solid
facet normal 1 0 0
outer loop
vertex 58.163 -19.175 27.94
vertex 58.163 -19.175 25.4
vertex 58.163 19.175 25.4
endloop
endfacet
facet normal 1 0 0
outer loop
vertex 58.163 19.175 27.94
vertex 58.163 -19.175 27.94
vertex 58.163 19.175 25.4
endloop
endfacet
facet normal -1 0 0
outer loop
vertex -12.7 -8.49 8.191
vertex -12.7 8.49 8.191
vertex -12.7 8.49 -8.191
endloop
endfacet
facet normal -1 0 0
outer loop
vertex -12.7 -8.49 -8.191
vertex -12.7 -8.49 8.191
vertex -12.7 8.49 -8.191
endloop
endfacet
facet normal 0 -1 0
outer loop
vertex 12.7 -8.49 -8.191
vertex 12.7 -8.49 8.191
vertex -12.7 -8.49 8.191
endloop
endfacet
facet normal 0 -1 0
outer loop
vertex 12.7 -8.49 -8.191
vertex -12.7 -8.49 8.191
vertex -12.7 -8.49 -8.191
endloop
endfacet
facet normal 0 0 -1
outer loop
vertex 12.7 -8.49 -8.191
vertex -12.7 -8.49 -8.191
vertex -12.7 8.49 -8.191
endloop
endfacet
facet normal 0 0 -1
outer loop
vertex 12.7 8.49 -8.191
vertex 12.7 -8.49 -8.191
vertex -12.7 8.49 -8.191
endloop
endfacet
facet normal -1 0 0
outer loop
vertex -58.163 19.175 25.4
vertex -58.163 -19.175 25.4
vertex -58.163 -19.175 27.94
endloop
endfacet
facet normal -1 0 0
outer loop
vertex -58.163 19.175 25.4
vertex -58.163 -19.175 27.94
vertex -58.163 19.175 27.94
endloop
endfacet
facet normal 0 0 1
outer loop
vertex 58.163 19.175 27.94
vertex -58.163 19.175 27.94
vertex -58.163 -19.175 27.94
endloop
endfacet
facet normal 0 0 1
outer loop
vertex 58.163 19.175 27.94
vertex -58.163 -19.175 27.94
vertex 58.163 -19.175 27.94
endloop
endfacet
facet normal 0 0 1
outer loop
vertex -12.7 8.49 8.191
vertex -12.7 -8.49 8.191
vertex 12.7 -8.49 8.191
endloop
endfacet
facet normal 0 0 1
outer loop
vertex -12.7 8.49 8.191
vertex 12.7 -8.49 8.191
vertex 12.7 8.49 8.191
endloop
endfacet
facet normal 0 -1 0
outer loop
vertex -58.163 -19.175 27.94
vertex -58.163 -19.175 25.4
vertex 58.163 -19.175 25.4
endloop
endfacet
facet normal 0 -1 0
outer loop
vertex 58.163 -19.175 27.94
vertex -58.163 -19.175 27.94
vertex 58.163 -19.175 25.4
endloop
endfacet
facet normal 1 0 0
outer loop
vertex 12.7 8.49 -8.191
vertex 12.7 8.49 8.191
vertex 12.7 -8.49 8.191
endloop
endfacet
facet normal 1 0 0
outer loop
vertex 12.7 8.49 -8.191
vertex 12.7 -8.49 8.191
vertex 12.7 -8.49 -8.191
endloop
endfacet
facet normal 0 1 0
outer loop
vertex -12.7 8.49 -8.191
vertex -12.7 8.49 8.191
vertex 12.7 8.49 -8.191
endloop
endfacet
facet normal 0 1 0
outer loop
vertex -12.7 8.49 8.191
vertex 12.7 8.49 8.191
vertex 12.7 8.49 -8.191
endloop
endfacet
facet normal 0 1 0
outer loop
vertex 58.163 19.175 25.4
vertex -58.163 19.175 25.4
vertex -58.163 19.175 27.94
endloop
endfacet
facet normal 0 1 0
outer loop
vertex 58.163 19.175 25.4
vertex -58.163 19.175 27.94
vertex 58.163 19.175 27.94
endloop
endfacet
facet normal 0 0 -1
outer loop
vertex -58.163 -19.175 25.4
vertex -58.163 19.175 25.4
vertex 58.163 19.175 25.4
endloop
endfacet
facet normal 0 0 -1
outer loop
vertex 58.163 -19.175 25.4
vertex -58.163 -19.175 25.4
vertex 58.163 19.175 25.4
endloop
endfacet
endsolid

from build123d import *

# Parameters (mm, degrees)
SKETCH2_W                = 116.326794342
SKETCH2_H                = 38.349309978
OUT_IN_Z_DIRECTION_DEPTH = 2.54
SKETCH3_W                = 16.381902108
SKETCH3_H                = 16.980023094
AT_ORIGIN_DEPTH          = 12.7


with BuildPart() as part:
    # Sketch2 → out in z direction (new body)
    with BuildSketch(Plane.XY.offset(25.4)):
        Rectangle(SKETCH2_W, SKETCH2_H)
    extrude(amount=OUT_IN_Z_DIRECTION_DEPTH)


with BuildPart() as body_2:
    # Sketch3 → at origin (new, symmetric)
    with BuildSketch(Plane(origin=(0, 0, 0), x_dir=(0, 0, -1), z_dir=(1, 0, 0))):
        Rectangle(SKETCH3_W, SKETCH3_H)
    extrude(amount=AT_ORIGIN_DEPTH, both=True)


solid = Compound([part.part, body_2.part])
